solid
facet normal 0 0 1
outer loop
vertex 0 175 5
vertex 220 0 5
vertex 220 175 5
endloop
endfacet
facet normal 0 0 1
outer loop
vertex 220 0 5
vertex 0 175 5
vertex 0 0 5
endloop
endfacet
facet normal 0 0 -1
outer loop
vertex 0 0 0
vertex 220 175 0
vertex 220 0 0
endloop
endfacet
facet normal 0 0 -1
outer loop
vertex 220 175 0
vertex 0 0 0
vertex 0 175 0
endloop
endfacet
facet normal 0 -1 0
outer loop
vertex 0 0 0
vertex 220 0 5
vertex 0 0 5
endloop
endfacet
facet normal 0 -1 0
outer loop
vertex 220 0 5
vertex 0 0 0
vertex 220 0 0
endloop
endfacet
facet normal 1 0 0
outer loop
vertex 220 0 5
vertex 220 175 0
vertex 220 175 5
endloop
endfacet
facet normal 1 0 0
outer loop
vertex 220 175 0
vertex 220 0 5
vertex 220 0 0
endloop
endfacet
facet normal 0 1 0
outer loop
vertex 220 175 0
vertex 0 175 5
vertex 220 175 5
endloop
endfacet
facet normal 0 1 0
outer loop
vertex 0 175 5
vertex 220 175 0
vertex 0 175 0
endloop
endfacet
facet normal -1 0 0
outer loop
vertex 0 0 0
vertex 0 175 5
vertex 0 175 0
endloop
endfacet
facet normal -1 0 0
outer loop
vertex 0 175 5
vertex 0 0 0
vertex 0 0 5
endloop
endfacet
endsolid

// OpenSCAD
color("lightblue"){
    cube([220,175,5]);
}

// todo: add screw holes
